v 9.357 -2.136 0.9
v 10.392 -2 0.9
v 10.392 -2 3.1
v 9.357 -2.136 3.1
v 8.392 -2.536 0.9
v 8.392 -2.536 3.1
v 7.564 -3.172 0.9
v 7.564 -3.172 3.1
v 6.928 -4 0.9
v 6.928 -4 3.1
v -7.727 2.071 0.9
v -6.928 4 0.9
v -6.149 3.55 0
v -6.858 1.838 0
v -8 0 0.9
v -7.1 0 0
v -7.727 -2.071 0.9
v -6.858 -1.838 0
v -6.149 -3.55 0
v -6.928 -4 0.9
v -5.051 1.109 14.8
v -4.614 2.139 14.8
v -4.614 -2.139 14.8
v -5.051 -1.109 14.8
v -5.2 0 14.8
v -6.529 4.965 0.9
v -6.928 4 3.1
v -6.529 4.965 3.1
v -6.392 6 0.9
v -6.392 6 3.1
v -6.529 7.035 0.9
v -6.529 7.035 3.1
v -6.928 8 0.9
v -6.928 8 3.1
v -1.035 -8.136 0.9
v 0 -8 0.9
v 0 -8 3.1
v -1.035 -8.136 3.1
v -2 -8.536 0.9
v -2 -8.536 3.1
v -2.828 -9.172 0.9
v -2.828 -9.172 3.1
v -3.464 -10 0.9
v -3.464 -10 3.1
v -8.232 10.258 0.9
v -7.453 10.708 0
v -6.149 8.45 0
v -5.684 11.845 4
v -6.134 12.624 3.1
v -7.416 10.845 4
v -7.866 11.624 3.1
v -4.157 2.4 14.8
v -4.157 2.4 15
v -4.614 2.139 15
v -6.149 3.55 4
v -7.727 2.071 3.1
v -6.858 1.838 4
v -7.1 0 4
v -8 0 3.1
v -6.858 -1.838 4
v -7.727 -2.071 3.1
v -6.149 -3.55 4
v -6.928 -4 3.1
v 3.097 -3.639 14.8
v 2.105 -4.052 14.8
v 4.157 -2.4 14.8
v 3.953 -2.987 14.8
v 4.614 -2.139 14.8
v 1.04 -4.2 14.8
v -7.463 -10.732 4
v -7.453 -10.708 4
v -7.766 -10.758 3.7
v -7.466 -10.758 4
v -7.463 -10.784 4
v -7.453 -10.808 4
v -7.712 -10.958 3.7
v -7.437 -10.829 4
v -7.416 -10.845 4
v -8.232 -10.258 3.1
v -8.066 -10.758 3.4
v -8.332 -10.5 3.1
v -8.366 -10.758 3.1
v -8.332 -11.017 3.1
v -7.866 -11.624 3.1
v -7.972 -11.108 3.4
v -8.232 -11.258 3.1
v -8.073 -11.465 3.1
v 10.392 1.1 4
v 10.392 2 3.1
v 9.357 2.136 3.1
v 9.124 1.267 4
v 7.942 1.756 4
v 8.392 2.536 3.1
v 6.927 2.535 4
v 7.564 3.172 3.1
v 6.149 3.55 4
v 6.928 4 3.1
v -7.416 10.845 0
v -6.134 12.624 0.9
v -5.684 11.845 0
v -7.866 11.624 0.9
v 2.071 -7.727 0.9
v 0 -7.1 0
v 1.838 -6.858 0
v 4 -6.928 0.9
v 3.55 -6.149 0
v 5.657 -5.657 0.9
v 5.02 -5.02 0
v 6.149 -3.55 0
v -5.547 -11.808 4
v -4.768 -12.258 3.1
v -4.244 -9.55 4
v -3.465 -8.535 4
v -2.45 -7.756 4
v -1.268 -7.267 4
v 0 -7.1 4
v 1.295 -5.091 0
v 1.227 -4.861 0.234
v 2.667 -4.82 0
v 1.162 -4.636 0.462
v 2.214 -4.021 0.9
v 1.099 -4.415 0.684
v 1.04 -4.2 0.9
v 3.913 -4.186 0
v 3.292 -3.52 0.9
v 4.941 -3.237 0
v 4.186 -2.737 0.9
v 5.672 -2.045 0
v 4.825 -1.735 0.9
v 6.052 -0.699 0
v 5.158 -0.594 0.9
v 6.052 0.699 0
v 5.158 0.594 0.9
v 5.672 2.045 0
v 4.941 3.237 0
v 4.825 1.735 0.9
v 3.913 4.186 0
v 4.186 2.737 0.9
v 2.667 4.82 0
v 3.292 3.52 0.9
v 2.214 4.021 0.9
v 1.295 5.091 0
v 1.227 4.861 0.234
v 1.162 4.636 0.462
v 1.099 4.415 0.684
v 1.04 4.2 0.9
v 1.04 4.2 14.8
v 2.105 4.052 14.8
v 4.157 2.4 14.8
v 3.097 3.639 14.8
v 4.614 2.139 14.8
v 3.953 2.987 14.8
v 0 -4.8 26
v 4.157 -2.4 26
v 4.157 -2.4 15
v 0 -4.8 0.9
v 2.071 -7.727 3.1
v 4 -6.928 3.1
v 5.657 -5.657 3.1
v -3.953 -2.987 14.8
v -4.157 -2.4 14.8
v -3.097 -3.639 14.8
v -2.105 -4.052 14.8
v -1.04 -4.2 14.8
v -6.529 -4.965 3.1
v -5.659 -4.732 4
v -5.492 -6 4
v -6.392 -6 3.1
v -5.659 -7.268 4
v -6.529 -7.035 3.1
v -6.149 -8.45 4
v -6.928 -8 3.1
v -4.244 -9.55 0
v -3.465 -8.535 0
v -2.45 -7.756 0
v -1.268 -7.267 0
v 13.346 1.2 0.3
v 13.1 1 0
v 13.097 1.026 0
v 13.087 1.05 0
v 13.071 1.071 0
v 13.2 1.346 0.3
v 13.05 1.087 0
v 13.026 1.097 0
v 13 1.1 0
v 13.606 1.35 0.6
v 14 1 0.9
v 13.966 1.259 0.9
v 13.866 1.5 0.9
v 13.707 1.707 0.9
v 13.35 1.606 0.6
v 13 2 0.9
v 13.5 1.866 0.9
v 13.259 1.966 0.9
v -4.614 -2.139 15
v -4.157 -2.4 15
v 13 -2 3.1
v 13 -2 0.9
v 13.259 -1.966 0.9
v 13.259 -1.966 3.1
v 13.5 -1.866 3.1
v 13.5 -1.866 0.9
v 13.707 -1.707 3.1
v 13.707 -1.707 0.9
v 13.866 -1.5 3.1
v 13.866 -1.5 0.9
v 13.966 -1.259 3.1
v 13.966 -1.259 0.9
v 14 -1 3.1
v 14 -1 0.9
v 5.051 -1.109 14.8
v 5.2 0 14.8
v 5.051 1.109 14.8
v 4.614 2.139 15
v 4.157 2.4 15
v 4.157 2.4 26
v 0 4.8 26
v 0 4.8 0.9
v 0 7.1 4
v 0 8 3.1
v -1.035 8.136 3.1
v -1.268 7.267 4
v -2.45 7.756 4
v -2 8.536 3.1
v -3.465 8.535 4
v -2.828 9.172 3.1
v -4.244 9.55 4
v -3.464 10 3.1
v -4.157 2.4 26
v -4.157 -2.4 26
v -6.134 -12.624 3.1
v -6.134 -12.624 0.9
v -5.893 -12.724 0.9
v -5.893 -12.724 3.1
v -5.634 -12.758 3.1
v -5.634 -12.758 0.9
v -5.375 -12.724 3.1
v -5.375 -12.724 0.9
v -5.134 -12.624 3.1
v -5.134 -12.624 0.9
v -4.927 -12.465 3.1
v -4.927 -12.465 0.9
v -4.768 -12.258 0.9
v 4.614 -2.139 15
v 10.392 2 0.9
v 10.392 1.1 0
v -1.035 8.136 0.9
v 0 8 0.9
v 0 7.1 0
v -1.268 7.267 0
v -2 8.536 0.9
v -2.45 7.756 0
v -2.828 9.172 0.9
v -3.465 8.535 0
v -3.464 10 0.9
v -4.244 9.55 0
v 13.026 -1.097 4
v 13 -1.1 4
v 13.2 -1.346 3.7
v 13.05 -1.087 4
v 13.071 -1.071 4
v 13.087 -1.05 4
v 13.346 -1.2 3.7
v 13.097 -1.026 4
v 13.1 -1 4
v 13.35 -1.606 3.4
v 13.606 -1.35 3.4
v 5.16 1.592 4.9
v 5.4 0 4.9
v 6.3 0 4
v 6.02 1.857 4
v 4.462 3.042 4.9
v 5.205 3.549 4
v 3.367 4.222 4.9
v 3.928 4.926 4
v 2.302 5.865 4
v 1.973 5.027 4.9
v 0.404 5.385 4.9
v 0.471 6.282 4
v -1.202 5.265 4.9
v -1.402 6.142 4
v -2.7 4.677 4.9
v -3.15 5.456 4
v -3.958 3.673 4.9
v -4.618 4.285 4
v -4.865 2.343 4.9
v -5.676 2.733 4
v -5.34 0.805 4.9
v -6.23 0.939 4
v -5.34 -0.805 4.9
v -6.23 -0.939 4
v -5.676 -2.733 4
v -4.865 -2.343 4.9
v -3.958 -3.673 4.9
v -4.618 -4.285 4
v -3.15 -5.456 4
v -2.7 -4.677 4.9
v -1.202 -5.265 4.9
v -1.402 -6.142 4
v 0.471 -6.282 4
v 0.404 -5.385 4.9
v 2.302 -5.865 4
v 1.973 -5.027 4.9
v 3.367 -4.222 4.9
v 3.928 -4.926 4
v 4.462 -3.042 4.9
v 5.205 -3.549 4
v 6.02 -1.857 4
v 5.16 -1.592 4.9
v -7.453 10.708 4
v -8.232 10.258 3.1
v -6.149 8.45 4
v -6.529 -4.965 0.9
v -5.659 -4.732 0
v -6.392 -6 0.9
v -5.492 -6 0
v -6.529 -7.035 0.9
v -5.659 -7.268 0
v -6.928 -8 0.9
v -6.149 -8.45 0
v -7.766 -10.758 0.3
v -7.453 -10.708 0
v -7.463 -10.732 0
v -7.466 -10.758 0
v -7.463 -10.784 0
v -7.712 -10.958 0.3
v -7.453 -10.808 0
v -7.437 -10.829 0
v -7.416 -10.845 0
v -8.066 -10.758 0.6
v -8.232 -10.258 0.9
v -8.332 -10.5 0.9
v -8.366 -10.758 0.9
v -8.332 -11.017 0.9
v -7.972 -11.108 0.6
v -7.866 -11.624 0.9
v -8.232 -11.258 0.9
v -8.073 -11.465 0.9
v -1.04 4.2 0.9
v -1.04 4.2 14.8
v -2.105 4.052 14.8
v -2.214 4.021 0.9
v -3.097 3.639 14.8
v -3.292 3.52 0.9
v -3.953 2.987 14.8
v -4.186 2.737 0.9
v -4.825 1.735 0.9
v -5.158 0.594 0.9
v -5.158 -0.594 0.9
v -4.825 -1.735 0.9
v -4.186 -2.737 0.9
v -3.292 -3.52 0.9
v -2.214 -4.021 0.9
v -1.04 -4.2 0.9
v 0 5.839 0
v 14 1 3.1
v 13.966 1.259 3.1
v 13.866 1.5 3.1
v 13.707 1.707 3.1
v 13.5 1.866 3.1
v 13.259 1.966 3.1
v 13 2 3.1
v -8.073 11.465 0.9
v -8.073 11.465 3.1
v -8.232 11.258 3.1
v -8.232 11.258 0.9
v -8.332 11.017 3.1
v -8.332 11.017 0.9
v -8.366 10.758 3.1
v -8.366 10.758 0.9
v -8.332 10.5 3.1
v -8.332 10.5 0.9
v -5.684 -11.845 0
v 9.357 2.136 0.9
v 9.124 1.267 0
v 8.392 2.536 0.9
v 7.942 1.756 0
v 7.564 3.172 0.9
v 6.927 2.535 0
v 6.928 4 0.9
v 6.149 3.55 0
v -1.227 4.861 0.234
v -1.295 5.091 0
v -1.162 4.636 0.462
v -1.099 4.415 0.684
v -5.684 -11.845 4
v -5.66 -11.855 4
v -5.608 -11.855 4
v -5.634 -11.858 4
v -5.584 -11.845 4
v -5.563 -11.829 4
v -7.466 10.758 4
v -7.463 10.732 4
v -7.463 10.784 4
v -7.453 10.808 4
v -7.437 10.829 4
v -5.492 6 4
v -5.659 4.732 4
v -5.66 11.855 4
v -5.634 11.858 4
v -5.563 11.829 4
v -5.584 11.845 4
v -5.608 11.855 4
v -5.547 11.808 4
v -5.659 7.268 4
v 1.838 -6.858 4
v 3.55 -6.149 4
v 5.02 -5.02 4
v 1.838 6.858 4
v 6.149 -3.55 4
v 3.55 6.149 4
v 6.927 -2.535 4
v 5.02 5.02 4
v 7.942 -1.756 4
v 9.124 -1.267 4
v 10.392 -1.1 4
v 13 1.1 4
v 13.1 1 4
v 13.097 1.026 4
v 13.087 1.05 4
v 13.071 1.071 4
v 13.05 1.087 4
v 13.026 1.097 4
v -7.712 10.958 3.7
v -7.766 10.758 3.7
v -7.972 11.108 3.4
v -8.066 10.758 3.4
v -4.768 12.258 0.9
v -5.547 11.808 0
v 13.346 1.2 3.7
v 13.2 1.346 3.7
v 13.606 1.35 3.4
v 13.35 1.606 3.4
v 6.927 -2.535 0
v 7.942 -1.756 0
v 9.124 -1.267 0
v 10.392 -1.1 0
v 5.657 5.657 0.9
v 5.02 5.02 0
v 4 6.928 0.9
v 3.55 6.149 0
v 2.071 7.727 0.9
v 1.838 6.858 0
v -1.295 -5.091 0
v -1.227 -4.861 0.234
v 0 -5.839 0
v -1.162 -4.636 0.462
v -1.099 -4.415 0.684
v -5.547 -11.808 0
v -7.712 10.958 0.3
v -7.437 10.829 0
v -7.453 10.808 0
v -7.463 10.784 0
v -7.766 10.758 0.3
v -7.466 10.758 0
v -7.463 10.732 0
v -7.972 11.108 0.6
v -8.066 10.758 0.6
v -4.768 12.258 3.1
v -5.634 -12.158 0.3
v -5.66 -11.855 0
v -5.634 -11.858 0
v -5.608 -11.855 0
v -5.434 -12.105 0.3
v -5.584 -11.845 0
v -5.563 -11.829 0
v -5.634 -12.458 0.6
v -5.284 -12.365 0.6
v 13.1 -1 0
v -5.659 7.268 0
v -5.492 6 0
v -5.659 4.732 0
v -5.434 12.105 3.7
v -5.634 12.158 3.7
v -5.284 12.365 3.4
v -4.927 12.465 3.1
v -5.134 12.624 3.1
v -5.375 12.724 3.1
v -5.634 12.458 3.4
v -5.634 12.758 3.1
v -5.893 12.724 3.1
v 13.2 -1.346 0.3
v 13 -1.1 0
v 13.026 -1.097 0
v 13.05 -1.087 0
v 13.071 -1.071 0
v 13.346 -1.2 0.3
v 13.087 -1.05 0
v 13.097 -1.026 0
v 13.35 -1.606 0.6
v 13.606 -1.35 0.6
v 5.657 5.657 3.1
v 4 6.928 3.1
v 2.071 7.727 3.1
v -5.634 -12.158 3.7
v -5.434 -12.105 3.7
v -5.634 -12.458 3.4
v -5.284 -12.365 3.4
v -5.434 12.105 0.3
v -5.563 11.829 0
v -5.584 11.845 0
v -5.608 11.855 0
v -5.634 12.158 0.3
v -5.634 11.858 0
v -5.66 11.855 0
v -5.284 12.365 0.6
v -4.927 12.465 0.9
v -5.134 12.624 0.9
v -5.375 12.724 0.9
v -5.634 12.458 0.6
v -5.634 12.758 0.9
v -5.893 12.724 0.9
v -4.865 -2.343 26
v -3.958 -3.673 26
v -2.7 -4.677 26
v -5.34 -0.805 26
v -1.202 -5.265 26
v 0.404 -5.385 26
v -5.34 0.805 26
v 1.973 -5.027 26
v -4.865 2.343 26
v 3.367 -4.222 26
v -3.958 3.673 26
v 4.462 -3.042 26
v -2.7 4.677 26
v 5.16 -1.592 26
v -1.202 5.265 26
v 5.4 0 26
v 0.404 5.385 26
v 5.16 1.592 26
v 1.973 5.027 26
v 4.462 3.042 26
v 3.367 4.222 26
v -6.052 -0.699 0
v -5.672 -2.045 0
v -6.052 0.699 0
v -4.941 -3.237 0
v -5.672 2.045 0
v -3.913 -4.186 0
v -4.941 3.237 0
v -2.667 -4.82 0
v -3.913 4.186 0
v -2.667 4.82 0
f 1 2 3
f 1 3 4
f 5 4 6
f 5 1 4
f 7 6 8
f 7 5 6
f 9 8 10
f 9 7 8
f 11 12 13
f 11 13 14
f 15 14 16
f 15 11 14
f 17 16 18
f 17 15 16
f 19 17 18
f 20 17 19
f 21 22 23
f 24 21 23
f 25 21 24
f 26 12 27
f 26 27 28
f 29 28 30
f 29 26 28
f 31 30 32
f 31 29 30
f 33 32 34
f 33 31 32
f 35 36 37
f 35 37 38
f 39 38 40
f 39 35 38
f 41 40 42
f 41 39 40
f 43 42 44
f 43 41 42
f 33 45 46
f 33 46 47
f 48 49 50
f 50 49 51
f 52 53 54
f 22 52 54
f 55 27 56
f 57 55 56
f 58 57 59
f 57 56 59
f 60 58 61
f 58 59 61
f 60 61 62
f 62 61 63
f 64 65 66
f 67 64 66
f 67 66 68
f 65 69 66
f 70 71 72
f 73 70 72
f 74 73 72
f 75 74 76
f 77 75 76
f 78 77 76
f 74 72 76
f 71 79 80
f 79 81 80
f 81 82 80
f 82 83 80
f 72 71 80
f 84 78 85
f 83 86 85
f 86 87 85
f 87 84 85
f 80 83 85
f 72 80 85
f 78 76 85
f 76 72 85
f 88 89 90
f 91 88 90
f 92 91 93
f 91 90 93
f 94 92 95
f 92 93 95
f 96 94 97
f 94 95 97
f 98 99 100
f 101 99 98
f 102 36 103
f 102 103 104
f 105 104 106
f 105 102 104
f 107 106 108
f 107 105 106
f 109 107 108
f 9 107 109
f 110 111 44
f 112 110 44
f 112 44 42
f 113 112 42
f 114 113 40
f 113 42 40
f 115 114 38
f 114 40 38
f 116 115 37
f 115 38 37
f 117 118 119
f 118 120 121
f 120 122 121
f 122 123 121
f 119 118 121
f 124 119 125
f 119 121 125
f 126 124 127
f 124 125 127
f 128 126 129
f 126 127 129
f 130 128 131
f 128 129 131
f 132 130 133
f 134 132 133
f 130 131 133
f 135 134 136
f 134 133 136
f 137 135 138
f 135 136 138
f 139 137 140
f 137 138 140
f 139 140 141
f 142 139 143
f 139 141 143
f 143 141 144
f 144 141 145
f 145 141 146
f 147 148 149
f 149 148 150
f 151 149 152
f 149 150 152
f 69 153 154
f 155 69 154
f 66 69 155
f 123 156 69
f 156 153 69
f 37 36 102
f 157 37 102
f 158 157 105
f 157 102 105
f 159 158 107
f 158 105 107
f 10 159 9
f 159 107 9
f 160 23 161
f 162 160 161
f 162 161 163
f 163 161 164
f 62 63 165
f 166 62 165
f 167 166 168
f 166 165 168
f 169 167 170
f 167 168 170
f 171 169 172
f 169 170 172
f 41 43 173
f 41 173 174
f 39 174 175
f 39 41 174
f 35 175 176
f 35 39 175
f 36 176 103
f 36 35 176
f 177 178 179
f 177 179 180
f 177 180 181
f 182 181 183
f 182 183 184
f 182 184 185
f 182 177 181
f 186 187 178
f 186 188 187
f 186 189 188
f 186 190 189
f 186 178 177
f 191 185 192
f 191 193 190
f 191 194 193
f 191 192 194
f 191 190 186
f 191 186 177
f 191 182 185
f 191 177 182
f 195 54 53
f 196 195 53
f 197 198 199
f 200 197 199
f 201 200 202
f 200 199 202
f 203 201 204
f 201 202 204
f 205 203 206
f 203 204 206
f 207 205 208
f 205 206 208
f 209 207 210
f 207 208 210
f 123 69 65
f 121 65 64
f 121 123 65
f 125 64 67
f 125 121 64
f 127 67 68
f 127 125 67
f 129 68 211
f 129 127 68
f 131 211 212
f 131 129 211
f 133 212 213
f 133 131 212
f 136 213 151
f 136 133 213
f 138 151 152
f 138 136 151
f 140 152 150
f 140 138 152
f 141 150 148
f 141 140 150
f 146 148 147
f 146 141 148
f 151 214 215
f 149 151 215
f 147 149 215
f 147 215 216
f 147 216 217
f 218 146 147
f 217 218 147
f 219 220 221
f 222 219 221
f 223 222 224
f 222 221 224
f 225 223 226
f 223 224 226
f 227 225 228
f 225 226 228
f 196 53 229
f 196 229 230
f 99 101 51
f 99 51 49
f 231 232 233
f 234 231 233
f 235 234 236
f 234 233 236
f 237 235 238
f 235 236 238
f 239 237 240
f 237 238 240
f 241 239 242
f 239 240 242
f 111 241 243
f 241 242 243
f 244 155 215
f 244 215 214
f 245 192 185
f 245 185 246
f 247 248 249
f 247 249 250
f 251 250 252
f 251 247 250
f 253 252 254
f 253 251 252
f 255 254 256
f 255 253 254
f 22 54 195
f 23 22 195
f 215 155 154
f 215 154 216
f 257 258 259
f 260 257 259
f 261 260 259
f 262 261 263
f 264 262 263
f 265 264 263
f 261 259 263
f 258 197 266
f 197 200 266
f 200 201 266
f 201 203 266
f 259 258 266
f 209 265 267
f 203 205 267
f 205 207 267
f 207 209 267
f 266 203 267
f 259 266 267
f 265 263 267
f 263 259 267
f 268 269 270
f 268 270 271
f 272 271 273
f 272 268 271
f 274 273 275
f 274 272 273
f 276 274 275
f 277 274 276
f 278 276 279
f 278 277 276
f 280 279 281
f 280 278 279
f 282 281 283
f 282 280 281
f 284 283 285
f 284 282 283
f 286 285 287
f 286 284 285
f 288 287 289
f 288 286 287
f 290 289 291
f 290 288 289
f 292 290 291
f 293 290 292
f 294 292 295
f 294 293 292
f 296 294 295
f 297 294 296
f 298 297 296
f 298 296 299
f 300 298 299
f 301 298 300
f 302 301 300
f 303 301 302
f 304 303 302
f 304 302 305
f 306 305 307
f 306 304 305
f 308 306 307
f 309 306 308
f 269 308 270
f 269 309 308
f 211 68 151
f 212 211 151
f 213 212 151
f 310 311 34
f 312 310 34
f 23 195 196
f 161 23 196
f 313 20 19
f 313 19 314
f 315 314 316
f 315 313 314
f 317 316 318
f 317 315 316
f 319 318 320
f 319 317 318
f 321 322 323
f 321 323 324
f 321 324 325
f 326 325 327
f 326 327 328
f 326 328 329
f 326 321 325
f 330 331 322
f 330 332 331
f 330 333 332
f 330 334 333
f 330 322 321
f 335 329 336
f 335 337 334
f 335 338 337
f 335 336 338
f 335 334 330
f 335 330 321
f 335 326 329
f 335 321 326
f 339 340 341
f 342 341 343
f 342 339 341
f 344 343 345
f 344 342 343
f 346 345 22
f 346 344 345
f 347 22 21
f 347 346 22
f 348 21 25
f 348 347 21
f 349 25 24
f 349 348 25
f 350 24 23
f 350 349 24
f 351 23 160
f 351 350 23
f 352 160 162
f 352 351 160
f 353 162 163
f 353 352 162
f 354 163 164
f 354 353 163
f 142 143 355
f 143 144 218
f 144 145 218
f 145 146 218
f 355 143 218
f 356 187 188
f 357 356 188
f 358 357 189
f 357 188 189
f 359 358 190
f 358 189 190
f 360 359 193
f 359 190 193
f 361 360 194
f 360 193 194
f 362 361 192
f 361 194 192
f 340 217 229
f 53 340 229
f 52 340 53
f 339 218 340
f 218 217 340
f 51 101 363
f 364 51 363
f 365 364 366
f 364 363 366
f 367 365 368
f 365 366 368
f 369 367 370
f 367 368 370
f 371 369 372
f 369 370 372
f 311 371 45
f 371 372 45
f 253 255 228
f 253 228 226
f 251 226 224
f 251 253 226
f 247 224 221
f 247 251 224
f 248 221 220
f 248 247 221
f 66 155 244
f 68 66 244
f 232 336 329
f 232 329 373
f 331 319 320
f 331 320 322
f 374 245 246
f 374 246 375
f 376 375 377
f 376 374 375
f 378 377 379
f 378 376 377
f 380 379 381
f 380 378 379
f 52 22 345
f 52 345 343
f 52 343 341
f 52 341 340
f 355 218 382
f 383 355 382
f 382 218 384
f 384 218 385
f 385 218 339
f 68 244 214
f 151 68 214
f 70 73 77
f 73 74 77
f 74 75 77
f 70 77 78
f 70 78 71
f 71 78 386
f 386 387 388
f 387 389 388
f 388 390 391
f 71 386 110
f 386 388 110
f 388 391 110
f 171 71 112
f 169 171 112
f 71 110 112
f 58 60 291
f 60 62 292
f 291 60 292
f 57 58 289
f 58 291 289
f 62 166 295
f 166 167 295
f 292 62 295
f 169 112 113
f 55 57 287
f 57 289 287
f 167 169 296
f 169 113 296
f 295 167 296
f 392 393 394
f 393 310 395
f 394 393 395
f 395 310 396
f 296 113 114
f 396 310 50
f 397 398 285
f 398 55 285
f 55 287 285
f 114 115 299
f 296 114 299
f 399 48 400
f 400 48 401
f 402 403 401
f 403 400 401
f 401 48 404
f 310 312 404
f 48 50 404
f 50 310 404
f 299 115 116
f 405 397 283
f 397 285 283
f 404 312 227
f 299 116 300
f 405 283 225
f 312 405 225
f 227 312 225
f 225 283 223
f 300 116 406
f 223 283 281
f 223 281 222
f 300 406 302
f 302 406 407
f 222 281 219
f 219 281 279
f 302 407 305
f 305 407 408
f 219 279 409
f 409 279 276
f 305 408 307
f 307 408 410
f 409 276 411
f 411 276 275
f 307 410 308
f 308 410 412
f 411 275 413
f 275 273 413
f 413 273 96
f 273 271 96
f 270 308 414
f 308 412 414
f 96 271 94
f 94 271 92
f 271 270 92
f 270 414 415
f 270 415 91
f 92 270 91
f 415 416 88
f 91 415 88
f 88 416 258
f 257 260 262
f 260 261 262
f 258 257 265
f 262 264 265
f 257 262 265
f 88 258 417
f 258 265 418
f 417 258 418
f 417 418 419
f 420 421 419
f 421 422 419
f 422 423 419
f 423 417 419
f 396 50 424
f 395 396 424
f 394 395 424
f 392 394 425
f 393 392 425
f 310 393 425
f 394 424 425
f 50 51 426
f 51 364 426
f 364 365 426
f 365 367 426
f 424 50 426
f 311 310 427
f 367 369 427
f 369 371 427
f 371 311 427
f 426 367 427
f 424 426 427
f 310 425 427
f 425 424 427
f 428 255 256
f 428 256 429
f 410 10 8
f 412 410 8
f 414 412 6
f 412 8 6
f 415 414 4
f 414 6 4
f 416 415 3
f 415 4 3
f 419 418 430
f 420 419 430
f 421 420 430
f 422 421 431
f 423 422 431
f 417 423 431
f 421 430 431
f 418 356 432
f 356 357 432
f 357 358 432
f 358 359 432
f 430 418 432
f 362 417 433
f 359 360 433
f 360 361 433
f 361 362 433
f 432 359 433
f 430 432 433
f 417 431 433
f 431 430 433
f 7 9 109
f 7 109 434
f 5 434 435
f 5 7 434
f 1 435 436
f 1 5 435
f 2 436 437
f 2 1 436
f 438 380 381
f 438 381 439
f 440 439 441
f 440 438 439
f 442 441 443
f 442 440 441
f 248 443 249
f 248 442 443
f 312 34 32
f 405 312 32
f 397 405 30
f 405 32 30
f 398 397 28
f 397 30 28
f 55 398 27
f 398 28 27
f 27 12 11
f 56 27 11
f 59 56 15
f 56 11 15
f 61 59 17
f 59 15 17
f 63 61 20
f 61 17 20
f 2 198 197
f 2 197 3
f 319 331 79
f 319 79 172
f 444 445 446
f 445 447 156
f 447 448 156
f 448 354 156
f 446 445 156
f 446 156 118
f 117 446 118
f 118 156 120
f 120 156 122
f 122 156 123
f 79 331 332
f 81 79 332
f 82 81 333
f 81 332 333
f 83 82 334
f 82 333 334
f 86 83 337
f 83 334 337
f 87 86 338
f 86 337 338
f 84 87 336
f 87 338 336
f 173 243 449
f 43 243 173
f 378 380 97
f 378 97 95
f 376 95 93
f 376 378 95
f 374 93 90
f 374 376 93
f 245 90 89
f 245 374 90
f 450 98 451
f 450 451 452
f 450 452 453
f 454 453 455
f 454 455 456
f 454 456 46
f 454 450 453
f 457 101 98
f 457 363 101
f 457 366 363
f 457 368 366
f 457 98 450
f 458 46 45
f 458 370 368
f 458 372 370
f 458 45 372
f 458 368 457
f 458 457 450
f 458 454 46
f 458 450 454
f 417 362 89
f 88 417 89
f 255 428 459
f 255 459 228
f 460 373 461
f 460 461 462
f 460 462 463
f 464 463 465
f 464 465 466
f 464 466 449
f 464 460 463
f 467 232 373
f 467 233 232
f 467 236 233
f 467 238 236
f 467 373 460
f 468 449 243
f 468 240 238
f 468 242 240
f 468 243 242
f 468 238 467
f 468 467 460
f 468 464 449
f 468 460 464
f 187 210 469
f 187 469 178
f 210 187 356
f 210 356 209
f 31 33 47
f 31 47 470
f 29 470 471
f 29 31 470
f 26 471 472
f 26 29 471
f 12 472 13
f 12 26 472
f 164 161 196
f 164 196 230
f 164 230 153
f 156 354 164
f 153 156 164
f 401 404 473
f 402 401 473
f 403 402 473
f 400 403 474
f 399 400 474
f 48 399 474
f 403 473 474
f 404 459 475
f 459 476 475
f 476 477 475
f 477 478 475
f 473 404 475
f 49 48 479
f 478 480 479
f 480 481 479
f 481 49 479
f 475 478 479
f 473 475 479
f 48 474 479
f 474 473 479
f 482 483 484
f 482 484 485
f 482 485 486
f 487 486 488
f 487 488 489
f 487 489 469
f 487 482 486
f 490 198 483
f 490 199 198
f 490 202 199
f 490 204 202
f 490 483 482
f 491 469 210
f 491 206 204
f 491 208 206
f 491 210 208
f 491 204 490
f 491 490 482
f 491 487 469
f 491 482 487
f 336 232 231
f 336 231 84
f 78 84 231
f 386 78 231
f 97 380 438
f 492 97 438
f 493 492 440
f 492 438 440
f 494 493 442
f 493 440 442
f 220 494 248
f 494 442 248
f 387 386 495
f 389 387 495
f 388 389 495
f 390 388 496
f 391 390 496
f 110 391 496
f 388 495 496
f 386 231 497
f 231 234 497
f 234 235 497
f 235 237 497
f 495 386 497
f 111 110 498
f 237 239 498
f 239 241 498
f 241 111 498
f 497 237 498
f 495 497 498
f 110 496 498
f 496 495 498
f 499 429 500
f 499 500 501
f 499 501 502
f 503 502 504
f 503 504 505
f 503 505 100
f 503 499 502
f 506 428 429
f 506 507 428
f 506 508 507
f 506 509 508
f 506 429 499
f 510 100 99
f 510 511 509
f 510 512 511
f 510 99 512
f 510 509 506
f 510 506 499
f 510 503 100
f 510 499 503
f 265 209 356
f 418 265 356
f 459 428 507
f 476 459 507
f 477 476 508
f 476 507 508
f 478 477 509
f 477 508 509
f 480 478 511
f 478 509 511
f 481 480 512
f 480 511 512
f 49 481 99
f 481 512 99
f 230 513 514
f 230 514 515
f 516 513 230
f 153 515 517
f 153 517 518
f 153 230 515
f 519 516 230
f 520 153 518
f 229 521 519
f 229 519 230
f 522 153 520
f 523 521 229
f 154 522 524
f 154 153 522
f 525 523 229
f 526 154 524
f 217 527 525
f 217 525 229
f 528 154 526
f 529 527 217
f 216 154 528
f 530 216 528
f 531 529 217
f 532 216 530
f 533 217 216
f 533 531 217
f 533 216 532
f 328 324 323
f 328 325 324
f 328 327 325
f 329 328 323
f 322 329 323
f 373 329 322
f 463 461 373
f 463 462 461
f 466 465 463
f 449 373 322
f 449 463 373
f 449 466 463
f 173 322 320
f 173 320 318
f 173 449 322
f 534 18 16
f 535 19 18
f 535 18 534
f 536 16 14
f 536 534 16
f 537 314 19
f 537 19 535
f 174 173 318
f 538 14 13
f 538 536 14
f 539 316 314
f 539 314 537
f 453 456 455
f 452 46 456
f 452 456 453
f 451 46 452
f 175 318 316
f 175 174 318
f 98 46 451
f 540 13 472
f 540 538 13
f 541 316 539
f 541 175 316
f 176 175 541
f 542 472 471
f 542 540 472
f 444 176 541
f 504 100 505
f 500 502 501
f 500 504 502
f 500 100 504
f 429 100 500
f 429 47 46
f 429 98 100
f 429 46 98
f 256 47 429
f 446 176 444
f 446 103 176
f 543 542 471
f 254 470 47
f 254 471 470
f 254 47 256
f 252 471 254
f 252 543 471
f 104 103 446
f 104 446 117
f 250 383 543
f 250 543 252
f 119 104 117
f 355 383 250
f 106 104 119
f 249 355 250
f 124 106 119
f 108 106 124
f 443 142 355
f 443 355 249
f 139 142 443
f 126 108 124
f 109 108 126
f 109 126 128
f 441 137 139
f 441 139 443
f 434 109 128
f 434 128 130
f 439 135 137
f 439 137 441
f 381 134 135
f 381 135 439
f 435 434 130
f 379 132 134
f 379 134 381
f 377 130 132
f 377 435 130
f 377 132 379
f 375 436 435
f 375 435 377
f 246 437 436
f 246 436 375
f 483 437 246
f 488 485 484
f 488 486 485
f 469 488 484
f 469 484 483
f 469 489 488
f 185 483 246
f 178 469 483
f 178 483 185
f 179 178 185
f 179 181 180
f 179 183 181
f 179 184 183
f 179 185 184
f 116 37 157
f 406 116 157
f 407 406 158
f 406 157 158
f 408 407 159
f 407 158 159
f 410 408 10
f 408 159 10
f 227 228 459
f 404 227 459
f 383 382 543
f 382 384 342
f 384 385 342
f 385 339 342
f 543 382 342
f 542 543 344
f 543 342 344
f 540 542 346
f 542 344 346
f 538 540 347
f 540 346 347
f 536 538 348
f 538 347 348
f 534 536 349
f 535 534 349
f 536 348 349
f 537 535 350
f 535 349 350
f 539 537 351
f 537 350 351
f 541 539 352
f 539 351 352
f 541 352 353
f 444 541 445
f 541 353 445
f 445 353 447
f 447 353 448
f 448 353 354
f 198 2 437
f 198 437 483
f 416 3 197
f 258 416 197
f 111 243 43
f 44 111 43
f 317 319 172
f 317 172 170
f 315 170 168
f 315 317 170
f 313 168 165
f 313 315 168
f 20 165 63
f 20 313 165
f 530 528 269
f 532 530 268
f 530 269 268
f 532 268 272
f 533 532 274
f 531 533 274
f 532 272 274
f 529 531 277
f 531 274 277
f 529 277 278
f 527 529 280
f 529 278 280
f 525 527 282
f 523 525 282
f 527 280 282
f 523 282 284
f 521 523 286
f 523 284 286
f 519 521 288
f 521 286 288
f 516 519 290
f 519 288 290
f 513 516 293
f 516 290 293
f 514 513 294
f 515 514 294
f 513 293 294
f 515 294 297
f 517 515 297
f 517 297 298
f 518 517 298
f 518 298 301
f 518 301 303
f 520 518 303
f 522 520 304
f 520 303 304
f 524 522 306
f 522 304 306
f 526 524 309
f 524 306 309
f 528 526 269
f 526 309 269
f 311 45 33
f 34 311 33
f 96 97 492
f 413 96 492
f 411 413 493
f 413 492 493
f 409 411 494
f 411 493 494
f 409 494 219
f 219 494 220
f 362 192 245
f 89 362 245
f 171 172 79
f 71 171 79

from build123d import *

# Parameters (mm, degrees)
PAD_DEPTH          = 4
POLARPATTERN_COUNT = 3
SKETCH002_R        = 5.4
PAD001_DEPTH       = 22
POCKET_DEPTH       = 14.8
POCKET001_DEPTH    = 0.2
POCKET002_DEPTH    = 26.001
CHAMFER_SIZE       = 0.9
CHAMFER001_SIZE    = 0.9


with BuildPart() as part:
    # Sketch → Pad (new body)
    with BuildSketch(Plane.XY):
        with BuildLine():
            Line((14, 1), (14, -1))
            ThreePointArc((13, -2), (13.707107, -1.707107), (14, -1))
            Line((13, -2), (10.392305, -2))
            ThreePointArc((10.392305, -2), (8.392305, -2.535898), (6.928203, -4))
            ThreePointArc((6.928203, 4), (-8, 0), (6.928203, -4))
            ThreePointArc((6.928203, 4), (8.392305, 2.535898), (10.392305, 2))
            Line((13, 2), (10.392305, 2))
            ThreePointArc((14, 1), (13.707107, 1.707107), (13, 2))
        make_face()
    pad = extrude(amount=PAD_DEPTH)

    # PolarPattern: Pad ×3 about axis
    polarpattern_axis = Axis((0, 0, 0), (0, 0, 1))
    for i in range(1, POLARPATTERN_COUNT):
        add(pad.rotate(polarpattern_axis, i * 360 / POLARPATTERN_COUNT))

    # Sketch002 → Pad001 (join)
    with BuildSketch(Plane.XY.offset(4)):
        Circle(SKETCH002_R)
    extrude(amount=PAD001_DEPTH)

    # Sketch001 → Pocket (cut)
    with BuildSketch(Plane.XY):
        with BuildLine():
            ThreePointArc((-1, 4.2), (-5.2, 0), (-1, -4.2))
            Line((-1, -4.2), (1, -4.2))
            ThreePointArc((1, -4.2), (5.2, 0), (1, 4.2))
            Line((-1, 4.2), (1, 4.2))
        make_face()
    extrude(amount=POCKET_DEPTH, mode=Mode.SUBTRACT)

    # Sketch005 → Pocket001 (cut)
    with BuildSketch(Plane.XY.offset(15)):
        Polygon((-1, 4.2), (-4.614425, 2.139143), (-4.614425, -2.139143), (-1, -4.2), (1, -4.2), (4.614425, -2.139143), (4.614425, 2.139143), (1, 4.2), align=None)
    extrude(amount=-POCKET001_DEPTH, mode=Mode.SUBTRACT)

    # Sketch004 → Pocket002 (cut, through all)
    with BuildSketch(Plane.XY):
        Polygon((4.156922, -2.4), (4.156922, 2.4), (0, 4.8), (-4.156922, 2.4), (-4.156922, -2.4), (0, -4.8), align=None)
    extrude(amount=POCKET002_DEPTH, mode=Mode.SUBTRACT)

    # Chamfer
    chamfer_edges = [part.edges().sort_by_distance(p)[0] for p in [
        (13.707107, 1.707107, 4),
        (14, 0, 4),
        (11.696152, 2, 4),
        (13.707107, -1.707107, 4),
        (8.392305, 2.535898, 4),
        (11.696152, -2, 4),
        (4, 6.928203, 4),
        (8.392305, -2.535898, 4),
        (-2, 8.535898, 4),
        (4, -6.928203, 4),
        (-4.116025, 11.129165, 4),
        (-2, -8.535898, 4),
        (-5.375156, 12.724256, 4),
        (-4.116025, -11.129165, 4),
        (-7, 12.124356, 4),
        (-5.375156, -12.724256, 4),
        (-8.331951, 11.017149, 4),
        (-7, -12.124356, 4),
        (-7.580127, 9.129165, 4),
        (-8.331951, -11.017149, 4),
        (-6.392305, 6, 4),
        (-7.580127, -9.129165, 4),
        (-8, 0, 4),
        (-6.392305, -6, 4),
        (-5.4, 0, 4),
    ]]
    chamfer(chamfer_edges, length=CHAMFER_SIZE)

    # Chamfer001
    chamfer001_edges = [part.edges().sort_by_distance(p)[0] for p in [
        (13.707107, 1.707107, 0),
        (14, 0, 0),
        (11.696152, 2, 0),
        (13.707107, -1.707107, 0),
        (8.392305, 2.535898, 0),
        (11.696152, -2, 0),
        (4, 6.928203, 0),
        (8.392305, -2.535898, 0),
        (-2, 8.535898, 0),
        (4, -6.928203, 0),
        (-4.116025, 11.129165, 0),
        (-2, -8.535898, 0),
        (-5.375156, 12.724256, 0),
        (-4.116025, -11.129165, 0),
        (-7, 12.124356, 0),
        (-5.375156, -12.724256, 0),
        (-8.331951, 11.017149, 0),
        (-7, -12.124356, 0),
        (-7.580127, 9.129165, 0),
        (-8.331951, -11.017149, 0),
        (-6.392305, 6, 0),
        (-7.580127, -9.129165, 0),
        (-8, 0, 0),
        (-6.392305, -6, 0),
        (-0.519777, 4.499907, 0),
        (0.519777, 4.499907, 0),
        (5.2, 0, 0),
        (0.519777, -4.499907, 0),
        (-0.519777, -4.499907, 0),
        (-5.2, 0, 0),
    ]]
    chamfer(chamfer001_edges, length=CHAMFER001_SIZE)


solid = part.part
